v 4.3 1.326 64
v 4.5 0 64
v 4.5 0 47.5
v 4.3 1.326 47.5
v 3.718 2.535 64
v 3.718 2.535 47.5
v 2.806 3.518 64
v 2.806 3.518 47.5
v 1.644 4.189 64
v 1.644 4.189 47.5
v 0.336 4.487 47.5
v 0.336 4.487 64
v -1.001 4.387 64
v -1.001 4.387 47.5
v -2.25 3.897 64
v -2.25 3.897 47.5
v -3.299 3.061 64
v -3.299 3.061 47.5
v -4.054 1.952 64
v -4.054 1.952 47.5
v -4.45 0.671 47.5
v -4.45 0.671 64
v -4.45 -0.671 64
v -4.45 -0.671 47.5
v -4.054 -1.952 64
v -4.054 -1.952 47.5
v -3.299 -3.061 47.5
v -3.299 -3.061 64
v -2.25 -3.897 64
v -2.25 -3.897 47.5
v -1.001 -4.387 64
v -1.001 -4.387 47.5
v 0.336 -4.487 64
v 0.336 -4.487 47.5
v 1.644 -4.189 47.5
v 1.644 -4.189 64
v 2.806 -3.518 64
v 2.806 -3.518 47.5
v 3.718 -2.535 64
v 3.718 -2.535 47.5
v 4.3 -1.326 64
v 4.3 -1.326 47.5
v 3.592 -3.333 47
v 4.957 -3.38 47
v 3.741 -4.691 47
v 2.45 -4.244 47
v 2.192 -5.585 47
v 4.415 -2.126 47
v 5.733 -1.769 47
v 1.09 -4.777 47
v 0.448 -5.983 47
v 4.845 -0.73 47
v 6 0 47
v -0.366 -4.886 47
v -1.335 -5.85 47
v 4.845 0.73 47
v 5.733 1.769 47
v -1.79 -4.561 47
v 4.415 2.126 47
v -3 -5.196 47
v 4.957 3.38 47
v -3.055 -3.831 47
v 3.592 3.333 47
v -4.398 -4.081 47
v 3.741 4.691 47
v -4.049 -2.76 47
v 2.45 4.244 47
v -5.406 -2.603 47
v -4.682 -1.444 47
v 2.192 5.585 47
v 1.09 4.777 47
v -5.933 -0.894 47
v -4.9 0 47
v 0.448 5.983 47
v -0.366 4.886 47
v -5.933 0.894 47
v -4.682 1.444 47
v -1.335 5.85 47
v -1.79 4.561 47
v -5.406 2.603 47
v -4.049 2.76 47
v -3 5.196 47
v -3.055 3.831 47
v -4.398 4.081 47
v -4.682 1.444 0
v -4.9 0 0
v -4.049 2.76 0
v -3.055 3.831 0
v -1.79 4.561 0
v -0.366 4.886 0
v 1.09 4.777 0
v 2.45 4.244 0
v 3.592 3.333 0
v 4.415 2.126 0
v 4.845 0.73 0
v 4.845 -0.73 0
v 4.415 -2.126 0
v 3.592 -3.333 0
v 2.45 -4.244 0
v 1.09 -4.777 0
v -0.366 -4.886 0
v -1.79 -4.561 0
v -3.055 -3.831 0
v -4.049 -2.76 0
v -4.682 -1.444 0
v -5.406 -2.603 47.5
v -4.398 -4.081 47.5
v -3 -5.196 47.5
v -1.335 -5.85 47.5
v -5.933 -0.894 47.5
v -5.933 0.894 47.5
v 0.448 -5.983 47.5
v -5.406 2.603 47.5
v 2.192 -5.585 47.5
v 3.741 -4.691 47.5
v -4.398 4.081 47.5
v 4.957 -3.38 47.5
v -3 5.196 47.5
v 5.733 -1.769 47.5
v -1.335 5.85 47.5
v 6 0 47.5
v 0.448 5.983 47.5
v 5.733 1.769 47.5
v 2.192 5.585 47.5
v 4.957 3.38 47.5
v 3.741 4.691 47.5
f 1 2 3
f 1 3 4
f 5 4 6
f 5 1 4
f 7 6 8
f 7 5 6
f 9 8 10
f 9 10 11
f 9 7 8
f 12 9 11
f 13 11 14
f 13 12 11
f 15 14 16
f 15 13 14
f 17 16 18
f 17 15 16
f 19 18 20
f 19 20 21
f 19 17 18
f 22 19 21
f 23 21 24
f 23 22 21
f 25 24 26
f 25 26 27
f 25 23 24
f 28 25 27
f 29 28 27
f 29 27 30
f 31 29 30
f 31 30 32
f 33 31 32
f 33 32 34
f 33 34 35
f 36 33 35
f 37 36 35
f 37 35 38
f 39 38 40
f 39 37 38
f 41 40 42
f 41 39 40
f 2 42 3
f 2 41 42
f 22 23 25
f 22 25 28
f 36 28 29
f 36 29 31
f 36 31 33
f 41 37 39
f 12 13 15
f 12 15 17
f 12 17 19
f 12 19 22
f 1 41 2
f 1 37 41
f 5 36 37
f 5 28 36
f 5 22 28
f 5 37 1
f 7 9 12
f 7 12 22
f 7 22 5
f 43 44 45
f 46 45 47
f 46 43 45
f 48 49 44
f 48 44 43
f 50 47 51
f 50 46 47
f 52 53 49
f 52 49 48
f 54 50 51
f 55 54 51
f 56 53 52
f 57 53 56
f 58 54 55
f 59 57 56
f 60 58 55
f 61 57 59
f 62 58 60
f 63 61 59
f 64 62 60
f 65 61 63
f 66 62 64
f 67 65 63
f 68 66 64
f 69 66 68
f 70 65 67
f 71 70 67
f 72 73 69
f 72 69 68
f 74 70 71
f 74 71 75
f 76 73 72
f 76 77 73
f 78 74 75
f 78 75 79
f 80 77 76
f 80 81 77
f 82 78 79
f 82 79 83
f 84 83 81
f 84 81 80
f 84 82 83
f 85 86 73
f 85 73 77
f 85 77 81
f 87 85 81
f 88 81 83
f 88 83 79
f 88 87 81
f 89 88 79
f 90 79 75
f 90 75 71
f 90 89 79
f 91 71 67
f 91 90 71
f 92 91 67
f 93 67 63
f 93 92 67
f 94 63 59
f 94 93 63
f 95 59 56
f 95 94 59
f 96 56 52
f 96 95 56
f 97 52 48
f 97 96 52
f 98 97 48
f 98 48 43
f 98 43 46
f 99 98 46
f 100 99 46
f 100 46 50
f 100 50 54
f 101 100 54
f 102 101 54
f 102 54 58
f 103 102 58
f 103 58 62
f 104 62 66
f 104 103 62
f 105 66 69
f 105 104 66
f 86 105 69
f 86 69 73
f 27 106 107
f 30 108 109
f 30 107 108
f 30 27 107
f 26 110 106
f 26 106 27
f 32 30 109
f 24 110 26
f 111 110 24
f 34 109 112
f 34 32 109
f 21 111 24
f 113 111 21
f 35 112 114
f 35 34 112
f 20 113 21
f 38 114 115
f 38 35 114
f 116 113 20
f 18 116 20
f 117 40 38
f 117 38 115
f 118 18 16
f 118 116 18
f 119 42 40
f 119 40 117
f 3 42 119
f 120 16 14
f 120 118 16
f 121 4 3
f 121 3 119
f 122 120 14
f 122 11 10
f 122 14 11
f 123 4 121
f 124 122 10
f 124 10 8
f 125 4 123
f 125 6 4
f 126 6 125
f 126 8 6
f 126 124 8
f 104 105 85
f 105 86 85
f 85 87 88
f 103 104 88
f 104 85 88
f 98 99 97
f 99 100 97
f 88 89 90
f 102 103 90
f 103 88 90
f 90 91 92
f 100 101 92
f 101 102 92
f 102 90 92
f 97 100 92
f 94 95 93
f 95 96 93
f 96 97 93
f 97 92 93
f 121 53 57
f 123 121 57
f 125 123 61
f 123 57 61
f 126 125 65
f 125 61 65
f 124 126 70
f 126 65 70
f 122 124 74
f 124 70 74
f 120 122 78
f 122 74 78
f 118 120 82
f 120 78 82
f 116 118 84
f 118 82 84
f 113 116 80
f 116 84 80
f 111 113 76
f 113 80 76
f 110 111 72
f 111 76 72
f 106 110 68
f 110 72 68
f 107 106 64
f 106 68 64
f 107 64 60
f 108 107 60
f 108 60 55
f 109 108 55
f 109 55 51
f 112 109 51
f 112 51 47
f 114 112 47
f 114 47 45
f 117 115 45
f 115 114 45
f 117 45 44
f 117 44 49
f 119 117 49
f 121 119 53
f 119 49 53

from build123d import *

# Parameters (mm, degrees)
SZKIC1_R                    = 6
DODANIE_WYCI_GNI_CIE1_DEPTH = 64
SZKIC2_OUTSIDE_W            = 27.242
SZKIC2_OUTSIDE_H            = 27.242
SZKIC2_OUTSIDE_R            = 4.9
WYTNIJ_WYCI_GNI_CIE1_DEPTH  = 47
SZKIC3_OUTSIDE_W            = 27.242
SZKIC3_OUTSIDE_H            = 27.242
SZKIC3_OUTSIDE_R            = 4.5
WYTNIJ_WYCI_GNI_CIE2_DEPTH  = 16.5


with BuildPart() as part:
    # Szkic1 → Dodanie-wyciągnięcie1 (new body)
    with BuildSketch(Plane.XY):
        Circle(SZKIC1_R)
    extrude(amount=DODANIE_WYCI_GNI_CIE1_DEPTH)

    # Szkic2 outside → Wytnij-wyciągnięcie1 (cut)
    with BuildSketch(Plane(origin=(0, 0, 0), x_dir=(-1, 0, 0), z_dir=(0, 0, -1))):
        Rectangle(SZKIC2_OUTSIDE_W, SZKIC2_OUTSIDE_H)
        Circle(SZKIC2_OUTSIDE_R, mode=Mode.SUBTRACT)
    extrude(amount=-WYTNIJ_WYCI_GNI_CIE1_DEPTH, mode=Mode.SUBTRACT)

    # Szkic3 outside → Wytnij-wyciągnięcie2 (cut)
    with BuildSketch(Plane.XY.offset(64)):
        Rectangle(SZKIC3_OUTSIDE_W, SZKIC3_OUTSIDE_H)
        Circle(SZKIC3_OUTSIDE_R, mode=Mode.SUBTRACT)
    extrude(amount=-WYTNIJ_WYCI_GNI_CIE2_DEPTH, mode=Mode.SUBTRACT)


solid = part.part
